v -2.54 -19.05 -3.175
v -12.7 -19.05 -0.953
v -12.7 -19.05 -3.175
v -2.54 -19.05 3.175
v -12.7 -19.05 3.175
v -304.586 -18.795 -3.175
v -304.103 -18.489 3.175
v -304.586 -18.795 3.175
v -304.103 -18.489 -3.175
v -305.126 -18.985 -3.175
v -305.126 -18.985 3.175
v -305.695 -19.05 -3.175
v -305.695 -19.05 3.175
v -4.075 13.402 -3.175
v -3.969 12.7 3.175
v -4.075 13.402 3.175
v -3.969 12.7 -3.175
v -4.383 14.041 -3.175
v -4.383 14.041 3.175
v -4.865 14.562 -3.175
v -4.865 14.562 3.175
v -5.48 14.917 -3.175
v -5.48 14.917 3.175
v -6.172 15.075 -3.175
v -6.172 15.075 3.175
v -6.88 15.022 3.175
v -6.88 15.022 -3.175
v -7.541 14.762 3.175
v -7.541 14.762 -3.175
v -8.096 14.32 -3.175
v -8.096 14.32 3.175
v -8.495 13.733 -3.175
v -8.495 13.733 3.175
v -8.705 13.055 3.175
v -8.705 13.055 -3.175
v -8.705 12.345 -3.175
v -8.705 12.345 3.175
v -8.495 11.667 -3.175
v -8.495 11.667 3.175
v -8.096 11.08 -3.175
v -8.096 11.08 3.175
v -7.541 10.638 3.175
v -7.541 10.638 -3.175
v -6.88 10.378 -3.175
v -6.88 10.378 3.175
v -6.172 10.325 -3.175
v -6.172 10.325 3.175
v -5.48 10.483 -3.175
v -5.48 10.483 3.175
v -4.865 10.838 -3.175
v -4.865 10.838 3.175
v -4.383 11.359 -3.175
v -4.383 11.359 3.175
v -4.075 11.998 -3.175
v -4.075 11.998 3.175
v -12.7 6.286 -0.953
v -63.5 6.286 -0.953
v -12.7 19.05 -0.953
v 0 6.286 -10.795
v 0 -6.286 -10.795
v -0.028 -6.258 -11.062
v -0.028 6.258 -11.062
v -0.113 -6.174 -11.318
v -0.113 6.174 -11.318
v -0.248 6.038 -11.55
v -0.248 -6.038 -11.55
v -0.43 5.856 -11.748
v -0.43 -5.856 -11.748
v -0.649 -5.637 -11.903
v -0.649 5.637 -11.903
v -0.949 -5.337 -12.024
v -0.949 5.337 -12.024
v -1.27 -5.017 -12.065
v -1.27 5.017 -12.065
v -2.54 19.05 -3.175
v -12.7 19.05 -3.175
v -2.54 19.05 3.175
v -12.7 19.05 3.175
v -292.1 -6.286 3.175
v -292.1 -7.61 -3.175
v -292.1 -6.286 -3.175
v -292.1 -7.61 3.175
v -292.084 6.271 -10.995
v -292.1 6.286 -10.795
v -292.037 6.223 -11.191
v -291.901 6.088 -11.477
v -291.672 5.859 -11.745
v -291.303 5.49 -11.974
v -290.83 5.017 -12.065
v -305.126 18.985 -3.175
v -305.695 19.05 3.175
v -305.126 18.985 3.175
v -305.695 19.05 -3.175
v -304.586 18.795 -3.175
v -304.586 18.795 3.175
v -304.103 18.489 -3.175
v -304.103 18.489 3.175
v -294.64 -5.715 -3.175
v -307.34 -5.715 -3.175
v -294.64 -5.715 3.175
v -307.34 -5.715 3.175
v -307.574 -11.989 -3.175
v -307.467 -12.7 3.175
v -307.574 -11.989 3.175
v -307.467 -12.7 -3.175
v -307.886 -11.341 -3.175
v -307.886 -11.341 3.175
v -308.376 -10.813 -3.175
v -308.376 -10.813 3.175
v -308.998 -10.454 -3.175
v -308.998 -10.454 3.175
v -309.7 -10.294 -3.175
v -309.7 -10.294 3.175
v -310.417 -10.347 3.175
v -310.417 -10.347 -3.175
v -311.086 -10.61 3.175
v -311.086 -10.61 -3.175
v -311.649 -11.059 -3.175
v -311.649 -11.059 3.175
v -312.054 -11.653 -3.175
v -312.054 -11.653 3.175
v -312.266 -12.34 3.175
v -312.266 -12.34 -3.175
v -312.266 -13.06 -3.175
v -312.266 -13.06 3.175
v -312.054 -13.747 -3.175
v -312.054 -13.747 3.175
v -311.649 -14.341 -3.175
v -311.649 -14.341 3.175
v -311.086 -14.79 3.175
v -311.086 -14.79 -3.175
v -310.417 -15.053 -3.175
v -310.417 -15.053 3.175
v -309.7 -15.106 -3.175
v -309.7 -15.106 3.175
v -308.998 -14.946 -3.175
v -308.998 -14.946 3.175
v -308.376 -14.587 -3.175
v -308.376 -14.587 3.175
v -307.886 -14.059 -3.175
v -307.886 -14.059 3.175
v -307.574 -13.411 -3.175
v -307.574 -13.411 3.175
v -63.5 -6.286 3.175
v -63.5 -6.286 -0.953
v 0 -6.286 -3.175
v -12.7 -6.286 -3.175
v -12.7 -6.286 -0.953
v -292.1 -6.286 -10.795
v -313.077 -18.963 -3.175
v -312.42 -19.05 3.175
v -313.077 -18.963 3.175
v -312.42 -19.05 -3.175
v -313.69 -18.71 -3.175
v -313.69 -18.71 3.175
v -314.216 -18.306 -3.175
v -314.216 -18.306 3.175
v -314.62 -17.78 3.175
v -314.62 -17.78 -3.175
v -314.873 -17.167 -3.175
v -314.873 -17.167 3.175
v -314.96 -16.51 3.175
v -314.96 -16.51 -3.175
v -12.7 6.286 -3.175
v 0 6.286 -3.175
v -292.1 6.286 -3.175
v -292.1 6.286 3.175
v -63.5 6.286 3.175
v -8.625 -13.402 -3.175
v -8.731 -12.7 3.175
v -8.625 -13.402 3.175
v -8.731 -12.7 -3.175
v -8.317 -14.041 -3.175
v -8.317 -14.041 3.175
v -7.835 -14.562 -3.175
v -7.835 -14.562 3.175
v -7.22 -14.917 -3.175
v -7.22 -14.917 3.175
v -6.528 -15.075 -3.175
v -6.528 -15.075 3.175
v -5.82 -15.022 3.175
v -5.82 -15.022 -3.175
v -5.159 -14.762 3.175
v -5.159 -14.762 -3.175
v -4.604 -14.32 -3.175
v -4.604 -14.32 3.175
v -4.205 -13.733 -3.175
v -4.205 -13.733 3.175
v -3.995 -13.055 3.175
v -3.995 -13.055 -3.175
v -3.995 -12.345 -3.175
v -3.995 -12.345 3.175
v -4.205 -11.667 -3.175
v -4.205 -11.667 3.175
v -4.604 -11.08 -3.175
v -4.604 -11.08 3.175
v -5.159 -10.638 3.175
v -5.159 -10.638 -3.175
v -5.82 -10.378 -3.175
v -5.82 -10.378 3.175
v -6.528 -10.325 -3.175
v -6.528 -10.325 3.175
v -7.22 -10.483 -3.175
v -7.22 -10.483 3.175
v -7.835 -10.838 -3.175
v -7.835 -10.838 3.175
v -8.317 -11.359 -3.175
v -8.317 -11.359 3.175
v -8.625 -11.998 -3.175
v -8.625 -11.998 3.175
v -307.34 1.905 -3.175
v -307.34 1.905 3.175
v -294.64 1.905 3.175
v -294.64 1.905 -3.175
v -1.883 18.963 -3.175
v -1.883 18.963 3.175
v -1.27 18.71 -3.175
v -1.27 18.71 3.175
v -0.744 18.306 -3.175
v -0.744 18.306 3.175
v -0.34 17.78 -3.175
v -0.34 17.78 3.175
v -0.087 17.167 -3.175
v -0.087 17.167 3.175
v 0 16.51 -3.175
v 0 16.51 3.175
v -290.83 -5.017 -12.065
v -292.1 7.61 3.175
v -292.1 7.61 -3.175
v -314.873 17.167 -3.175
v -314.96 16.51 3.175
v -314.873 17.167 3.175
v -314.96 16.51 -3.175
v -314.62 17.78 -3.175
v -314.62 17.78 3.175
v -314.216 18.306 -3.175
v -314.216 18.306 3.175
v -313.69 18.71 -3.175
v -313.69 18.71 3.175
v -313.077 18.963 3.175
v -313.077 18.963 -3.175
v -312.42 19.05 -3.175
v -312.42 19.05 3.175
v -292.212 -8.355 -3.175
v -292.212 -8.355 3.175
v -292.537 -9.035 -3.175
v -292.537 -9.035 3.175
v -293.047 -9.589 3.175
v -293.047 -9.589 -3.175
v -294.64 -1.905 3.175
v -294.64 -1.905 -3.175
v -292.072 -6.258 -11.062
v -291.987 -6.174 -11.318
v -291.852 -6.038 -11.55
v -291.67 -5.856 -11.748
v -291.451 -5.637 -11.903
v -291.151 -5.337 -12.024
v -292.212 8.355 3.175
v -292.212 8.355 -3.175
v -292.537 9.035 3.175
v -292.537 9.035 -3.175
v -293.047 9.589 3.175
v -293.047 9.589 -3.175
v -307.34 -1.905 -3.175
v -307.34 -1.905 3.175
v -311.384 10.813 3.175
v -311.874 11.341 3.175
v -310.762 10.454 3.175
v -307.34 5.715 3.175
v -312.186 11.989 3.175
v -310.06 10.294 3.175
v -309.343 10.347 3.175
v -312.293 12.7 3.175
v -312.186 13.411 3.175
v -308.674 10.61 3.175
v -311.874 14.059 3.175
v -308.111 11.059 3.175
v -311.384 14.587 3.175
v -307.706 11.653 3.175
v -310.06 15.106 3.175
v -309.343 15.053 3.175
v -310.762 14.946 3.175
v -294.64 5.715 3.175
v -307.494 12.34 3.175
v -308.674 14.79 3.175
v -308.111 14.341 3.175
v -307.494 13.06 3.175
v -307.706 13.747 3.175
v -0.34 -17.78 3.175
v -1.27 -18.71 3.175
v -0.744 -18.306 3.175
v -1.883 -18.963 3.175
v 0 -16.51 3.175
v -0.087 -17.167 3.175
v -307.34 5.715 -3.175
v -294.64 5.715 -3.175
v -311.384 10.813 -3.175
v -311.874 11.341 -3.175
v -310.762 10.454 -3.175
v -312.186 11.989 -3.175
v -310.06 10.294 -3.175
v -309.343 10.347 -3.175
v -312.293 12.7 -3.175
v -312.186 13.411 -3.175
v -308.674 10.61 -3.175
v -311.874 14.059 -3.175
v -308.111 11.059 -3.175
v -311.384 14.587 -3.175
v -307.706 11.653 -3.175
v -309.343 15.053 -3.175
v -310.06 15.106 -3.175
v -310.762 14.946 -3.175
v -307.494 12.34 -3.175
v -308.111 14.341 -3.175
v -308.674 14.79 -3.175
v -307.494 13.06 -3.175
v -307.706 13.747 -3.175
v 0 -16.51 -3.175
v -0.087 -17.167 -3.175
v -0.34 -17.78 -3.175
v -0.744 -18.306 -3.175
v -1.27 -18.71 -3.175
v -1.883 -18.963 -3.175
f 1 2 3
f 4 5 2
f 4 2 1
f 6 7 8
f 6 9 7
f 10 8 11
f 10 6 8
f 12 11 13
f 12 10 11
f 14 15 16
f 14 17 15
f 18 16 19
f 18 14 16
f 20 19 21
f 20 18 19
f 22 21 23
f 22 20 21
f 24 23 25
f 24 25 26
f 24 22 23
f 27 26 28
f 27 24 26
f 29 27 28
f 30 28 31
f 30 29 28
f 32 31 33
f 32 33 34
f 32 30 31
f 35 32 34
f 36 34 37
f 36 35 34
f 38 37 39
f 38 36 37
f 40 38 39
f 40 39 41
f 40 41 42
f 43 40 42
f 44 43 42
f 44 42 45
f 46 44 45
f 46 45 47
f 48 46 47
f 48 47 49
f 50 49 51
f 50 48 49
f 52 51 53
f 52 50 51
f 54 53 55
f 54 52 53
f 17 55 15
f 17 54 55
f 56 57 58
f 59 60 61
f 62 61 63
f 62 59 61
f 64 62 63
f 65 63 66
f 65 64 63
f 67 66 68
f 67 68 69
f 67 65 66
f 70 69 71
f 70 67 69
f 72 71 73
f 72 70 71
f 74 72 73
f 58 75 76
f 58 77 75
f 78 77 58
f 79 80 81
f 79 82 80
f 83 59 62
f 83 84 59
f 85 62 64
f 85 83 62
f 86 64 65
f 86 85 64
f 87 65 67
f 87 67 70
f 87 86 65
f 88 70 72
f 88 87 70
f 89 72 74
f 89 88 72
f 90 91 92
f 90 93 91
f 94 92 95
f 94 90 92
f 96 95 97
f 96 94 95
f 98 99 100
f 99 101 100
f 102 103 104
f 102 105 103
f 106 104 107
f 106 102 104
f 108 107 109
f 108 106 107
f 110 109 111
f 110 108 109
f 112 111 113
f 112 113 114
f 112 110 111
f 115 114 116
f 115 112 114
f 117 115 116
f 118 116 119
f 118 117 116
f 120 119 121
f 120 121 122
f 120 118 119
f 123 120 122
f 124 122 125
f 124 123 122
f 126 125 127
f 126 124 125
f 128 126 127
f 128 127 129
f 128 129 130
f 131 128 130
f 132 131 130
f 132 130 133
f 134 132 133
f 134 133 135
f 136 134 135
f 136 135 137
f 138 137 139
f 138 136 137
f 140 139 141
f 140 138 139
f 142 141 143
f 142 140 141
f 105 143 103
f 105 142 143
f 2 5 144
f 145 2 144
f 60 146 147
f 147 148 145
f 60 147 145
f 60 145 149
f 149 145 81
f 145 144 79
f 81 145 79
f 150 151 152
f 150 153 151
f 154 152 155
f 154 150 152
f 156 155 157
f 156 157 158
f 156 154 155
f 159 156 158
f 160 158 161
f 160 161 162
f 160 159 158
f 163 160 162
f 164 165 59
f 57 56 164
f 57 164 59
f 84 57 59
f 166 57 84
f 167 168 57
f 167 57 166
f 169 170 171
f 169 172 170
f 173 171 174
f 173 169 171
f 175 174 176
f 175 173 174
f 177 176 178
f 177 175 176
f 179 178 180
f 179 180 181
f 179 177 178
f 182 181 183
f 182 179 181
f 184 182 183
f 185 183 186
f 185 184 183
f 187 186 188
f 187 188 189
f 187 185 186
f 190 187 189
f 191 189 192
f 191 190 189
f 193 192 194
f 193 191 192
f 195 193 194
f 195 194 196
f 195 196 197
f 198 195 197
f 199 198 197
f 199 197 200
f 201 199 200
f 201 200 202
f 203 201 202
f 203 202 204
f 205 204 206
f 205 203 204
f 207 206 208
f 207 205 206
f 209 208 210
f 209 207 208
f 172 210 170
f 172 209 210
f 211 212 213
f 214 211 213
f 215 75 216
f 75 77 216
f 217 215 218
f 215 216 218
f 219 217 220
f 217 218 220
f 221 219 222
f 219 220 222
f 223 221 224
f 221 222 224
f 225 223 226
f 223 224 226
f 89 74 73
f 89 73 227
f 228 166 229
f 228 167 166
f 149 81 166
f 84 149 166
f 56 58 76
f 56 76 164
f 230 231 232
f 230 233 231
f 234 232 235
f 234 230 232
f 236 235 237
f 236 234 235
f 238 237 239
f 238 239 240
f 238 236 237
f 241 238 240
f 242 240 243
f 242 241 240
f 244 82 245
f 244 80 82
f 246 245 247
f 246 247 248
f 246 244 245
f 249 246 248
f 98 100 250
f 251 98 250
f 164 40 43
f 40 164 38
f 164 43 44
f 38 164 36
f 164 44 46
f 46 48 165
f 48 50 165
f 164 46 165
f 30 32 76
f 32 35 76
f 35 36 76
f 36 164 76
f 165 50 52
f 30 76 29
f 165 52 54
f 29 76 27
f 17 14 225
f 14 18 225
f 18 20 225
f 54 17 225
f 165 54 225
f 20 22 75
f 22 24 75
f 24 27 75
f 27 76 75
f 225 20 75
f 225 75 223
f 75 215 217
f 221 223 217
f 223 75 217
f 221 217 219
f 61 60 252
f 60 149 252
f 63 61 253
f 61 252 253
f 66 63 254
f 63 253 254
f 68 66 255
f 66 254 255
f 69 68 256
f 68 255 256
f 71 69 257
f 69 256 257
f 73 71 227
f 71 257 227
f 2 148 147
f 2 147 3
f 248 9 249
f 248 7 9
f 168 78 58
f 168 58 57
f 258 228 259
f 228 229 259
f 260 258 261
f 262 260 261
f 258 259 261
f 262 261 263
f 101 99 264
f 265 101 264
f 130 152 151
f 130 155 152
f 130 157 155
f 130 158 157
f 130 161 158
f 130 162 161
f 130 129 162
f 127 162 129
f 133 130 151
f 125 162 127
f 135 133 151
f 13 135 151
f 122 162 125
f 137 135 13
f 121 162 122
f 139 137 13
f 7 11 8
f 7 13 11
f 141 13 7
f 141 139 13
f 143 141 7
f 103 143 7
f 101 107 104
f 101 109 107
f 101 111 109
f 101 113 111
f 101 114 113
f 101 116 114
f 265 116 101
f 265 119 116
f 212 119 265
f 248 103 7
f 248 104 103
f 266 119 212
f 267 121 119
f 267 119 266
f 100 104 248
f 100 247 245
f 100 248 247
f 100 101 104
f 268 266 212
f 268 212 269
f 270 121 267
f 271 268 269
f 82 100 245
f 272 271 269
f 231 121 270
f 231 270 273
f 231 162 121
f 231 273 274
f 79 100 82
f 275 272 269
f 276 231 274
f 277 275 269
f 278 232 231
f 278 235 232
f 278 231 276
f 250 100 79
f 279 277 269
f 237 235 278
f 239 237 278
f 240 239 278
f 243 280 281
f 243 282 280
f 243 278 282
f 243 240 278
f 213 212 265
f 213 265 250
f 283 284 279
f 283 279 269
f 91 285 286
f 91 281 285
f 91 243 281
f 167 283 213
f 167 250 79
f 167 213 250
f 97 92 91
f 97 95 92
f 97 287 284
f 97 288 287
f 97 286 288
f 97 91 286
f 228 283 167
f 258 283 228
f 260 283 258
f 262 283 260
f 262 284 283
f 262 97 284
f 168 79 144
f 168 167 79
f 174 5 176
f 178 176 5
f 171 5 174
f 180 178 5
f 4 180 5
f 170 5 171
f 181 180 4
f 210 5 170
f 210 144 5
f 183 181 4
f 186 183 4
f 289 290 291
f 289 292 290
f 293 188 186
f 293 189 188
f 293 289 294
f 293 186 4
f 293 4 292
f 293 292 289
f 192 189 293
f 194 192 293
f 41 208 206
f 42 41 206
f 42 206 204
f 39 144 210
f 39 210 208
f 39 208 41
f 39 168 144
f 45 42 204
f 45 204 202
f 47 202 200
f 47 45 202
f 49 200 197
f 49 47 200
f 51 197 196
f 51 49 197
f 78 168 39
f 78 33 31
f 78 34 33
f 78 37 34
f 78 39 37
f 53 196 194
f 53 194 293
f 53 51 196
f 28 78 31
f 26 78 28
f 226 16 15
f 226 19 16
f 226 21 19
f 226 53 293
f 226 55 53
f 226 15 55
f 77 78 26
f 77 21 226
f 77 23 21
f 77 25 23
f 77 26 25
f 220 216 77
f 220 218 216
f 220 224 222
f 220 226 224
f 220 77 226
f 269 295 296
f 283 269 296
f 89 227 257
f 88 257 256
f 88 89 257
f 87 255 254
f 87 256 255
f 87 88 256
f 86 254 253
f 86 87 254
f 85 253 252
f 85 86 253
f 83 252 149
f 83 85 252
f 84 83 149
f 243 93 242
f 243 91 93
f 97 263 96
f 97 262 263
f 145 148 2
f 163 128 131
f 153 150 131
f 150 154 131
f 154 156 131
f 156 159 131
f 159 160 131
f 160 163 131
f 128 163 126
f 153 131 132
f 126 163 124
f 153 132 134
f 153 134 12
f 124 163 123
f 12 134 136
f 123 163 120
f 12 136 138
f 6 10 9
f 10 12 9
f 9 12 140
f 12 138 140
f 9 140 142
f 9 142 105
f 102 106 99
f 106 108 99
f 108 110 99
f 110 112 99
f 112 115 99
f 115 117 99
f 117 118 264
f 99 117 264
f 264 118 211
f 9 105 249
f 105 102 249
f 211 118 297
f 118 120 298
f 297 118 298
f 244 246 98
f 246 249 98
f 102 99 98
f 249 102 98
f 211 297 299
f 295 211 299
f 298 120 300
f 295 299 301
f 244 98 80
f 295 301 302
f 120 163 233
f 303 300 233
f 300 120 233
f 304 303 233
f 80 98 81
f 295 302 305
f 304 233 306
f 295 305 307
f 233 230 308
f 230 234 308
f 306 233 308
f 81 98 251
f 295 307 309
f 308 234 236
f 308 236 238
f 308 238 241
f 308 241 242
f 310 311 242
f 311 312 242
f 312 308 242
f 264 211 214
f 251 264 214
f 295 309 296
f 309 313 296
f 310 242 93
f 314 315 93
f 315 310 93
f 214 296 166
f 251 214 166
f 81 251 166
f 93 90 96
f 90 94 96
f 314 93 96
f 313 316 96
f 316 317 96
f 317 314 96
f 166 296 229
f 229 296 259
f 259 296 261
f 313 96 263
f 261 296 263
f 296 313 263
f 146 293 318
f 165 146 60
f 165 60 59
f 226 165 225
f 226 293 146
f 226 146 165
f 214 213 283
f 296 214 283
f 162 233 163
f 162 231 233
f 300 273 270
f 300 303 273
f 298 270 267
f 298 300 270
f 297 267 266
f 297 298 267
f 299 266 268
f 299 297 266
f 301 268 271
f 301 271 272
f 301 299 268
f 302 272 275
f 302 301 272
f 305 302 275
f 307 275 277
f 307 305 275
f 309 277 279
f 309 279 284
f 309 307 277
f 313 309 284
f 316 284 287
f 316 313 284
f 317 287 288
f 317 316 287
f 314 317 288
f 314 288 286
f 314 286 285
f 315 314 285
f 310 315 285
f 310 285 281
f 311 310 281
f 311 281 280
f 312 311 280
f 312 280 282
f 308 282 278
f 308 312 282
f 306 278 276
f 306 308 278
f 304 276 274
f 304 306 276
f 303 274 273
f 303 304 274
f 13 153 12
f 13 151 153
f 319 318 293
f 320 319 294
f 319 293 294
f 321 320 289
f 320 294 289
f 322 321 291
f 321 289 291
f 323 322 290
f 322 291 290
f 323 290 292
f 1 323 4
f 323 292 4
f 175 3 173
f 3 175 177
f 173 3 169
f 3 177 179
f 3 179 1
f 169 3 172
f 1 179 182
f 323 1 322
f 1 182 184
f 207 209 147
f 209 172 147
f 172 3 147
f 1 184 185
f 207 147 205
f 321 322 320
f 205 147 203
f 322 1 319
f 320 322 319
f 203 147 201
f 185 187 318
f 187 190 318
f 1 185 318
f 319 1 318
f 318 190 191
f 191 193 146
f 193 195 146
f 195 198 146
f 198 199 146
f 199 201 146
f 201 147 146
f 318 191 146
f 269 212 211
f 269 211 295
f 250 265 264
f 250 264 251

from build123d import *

# Parameters (mm, degrees)
SKETCH1_R           = 2.413
SKETCH1_R_2         = 2.38125
SKETCH1_W           = 12.7
SKETCH1_H           = 3.81
BOSS_EXTRUDE1_DEPTH = 3.175
SKETCH3_W           = 292.1
SKETCH3_H           = 12.573
BOSS_EXTRUDE2_DEPTH = 8.89
BOSS_EXTRUDE3_DEPTH = 4.1275
FILLET1_R           = 2.54
FILLET2_R           = 1.27


with BuildPart() as part:
    # Sketch1 → Boss-Extrude1 (new, symmetric)
    with BuildSketch(Plane.XY):
        Polygon((-292.1, -6.2865), (-12.7, -6.2865), (-12.7, -19.05), (0, -19.05), (0, 19.05), (-12.7, 19.05), (-12.7, 6.2865), (-292.1, 6.2865), (-292.1, 8.8265), (-304.8, 19.05), (-314.96, 19.05), (-314.96, -19.05), (-304.8, -19.05), (-292.1, -8.8265), align=None)
        with Locations((-309.88, -12.7)):
            Circle(SKETCH1_R, mode=Mode.SUBTRACT)
        with Locations(Location((-309.88, 12.7, 0), (0, 0, 180))):
            Circle(SKETCH1_R, mode=Mode.SUBTRACT)
        with Locations((-6.35, 12.7)):
            Circle(SKETCH1_R_2, mode=Mode.SUBTRACT)
        with Locations(Location((-6.35, -12.7, 0), (0, 0, 180))):
            Circle(SKETCH1_R_2, mode=Mode.SUBTRACT)
        with Locations((-300.99, 3.81)):
            Rectangle(SKETCH1_W, SKETCH1_H, mode=Mode.SUBTRACT)
        with Locations((-300.99, -3.81)):
            Rectangle(SKETCH1_W, SKETCH1_H, mode=Mode.SUBTRACT)
    extrude(amount=BOSS_EXTRUDE1_DEPTH, both=True)

    # Sketch3 → Boss-Extrude2 (add)
    with BuildSketch(Plane(origin=(0, 0, -3.175), x_dir=(-1, 0, 0), z_dir=(0, 0, -1))):
        with Locations((146.05, 0)):
            Rectangle(SKETCH3_W, SKETCH3_H)
    extrude(amount=BOSS_EXTRUDE2_DEPTH)

    # Sketch4 → Boss-Extrude3 (add)
    with BuildSketch(Plane.XY.offset(3.175)):
        Polygon((-12.7, 19.05), (-63.5, 6.2865), (-12.7, 6.2865), align=None)
        Polygon((-12.7, -6.2865), (-12.7, -19.05), (-63.5, -6.2865), align=None)
    extrude(amount=-BOSS_EXTRUDE3_DEPTH)

    # Fillet1
    fillet1_edges = [part.edges().sort_by_distance(p)[0] for p in [
        (0, 19.05, 0),
        (0, -19.05, 0),
        (-292.1, -8.8265, 0),
        (-304.8, -19.05, 0),
        (-314.96, -19.05, 0),
        (-314.96, 19.05, 0),
        (-304.8, 19.05, 0),
        (-292.1, 8.8265, 0),
    ]]
    fillet(fillet1_edges, radius=FILLET1_R)

    # Fillet2
    fillet2_edges = [part.edges().sort_by_distance(p)[0] for p in [
        (0, 0, -12.065),
        (-146.05, -6.2865, -12.065),
        (-292.1, 0, -12.065),
        (-146.05, 6.2865, -12.065),
    ]]
    fillet(fillet2_edges, radius=FILLET2_R)


solid = part.part
